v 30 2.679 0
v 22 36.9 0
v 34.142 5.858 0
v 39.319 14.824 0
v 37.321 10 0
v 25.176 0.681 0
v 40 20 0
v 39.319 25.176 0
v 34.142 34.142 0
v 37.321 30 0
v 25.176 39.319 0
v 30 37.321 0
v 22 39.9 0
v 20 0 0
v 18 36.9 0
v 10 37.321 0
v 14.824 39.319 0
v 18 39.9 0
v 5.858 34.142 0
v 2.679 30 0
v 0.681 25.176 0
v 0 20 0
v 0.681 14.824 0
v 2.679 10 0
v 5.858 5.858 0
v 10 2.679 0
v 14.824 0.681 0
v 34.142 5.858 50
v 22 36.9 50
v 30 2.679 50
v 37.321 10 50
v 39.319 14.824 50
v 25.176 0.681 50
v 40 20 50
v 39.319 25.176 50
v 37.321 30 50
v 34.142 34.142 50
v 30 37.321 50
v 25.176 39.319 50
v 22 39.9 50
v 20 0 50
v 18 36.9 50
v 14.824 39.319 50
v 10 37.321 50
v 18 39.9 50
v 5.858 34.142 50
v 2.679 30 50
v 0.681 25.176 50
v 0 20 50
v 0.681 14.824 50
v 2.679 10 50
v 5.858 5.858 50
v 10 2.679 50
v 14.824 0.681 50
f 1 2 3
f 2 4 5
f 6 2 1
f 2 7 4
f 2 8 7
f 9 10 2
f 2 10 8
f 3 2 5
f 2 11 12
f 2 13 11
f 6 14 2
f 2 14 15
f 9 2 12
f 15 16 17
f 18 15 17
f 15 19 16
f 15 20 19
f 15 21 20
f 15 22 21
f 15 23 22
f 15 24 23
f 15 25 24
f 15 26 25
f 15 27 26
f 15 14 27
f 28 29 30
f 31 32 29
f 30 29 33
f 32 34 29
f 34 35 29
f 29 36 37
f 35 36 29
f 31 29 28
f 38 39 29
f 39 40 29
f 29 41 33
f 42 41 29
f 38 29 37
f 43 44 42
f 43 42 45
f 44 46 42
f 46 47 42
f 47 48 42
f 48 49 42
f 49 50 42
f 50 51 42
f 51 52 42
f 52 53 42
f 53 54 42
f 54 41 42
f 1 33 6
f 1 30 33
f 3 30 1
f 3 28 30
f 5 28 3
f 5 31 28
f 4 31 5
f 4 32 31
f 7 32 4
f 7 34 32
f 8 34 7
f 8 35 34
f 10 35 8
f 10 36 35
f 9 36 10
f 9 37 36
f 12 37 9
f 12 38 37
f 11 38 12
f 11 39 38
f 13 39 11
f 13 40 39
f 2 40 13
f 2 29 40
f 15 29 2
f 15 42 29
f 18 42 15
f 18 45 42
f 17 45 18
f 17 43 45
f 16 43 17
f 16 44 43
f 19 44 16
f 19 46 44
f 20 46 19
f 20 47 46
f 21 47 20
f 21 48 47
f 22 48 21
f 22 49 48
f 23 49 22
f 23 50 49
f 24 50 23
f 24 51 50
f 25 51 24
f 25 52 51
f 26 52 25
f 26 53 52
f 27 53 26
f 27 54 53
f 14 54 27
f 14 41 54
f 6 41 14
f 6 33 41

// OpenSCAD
$fn = 32;

// ----------------------------------------------------------------------
// Keyway shaft: d40 shaft, key 4 x 3 mm
// ----------------------------------------------------------------------

// --- parameters (mm) ---
shaft_r = 20;             // shaft radius
key_w = 4;                // keyway width
key_d = 3;                // keyway depth below the surface line
plate_t = 50;             // shaft length, Z (extrusion height)
fit_tol = 0.05;           // declared fit tolerance (prompt contract)
free_tol = 0.3;           // declared free tolerance (prompt contract)

shaft_d = 2 * shaft_r;  // shaft diameter
circle_step = 15;  // polygon sampling step, degrees

profile = [[14.824, 39.319], [10, 37.321], [5.858, 34.142], [2.679, 30], [0.681, 25.176], [0, 20], [0.681, 14.824], [2.679, 10], [5.858, 5.858], [10, 2.679], [14.824, 0.681], [20, 0], [25.176, 0.681], [30, 2.679], [34.142, 5.858], [37.321, 10], [39.319, 14.824], [40, 20], [39.319, 25.176], [37.321, 30], [34.142, 34.142], [30, 37.321], [25.176, 39.319], [22, 39.9], [22, 36.9], [18, 36.9], [18, 39.9]];  // primary outline, 27 points, counter clockwise

// --- the one profile operation ---
linear_extrude(height = plate_t) polygon(points = profile);
